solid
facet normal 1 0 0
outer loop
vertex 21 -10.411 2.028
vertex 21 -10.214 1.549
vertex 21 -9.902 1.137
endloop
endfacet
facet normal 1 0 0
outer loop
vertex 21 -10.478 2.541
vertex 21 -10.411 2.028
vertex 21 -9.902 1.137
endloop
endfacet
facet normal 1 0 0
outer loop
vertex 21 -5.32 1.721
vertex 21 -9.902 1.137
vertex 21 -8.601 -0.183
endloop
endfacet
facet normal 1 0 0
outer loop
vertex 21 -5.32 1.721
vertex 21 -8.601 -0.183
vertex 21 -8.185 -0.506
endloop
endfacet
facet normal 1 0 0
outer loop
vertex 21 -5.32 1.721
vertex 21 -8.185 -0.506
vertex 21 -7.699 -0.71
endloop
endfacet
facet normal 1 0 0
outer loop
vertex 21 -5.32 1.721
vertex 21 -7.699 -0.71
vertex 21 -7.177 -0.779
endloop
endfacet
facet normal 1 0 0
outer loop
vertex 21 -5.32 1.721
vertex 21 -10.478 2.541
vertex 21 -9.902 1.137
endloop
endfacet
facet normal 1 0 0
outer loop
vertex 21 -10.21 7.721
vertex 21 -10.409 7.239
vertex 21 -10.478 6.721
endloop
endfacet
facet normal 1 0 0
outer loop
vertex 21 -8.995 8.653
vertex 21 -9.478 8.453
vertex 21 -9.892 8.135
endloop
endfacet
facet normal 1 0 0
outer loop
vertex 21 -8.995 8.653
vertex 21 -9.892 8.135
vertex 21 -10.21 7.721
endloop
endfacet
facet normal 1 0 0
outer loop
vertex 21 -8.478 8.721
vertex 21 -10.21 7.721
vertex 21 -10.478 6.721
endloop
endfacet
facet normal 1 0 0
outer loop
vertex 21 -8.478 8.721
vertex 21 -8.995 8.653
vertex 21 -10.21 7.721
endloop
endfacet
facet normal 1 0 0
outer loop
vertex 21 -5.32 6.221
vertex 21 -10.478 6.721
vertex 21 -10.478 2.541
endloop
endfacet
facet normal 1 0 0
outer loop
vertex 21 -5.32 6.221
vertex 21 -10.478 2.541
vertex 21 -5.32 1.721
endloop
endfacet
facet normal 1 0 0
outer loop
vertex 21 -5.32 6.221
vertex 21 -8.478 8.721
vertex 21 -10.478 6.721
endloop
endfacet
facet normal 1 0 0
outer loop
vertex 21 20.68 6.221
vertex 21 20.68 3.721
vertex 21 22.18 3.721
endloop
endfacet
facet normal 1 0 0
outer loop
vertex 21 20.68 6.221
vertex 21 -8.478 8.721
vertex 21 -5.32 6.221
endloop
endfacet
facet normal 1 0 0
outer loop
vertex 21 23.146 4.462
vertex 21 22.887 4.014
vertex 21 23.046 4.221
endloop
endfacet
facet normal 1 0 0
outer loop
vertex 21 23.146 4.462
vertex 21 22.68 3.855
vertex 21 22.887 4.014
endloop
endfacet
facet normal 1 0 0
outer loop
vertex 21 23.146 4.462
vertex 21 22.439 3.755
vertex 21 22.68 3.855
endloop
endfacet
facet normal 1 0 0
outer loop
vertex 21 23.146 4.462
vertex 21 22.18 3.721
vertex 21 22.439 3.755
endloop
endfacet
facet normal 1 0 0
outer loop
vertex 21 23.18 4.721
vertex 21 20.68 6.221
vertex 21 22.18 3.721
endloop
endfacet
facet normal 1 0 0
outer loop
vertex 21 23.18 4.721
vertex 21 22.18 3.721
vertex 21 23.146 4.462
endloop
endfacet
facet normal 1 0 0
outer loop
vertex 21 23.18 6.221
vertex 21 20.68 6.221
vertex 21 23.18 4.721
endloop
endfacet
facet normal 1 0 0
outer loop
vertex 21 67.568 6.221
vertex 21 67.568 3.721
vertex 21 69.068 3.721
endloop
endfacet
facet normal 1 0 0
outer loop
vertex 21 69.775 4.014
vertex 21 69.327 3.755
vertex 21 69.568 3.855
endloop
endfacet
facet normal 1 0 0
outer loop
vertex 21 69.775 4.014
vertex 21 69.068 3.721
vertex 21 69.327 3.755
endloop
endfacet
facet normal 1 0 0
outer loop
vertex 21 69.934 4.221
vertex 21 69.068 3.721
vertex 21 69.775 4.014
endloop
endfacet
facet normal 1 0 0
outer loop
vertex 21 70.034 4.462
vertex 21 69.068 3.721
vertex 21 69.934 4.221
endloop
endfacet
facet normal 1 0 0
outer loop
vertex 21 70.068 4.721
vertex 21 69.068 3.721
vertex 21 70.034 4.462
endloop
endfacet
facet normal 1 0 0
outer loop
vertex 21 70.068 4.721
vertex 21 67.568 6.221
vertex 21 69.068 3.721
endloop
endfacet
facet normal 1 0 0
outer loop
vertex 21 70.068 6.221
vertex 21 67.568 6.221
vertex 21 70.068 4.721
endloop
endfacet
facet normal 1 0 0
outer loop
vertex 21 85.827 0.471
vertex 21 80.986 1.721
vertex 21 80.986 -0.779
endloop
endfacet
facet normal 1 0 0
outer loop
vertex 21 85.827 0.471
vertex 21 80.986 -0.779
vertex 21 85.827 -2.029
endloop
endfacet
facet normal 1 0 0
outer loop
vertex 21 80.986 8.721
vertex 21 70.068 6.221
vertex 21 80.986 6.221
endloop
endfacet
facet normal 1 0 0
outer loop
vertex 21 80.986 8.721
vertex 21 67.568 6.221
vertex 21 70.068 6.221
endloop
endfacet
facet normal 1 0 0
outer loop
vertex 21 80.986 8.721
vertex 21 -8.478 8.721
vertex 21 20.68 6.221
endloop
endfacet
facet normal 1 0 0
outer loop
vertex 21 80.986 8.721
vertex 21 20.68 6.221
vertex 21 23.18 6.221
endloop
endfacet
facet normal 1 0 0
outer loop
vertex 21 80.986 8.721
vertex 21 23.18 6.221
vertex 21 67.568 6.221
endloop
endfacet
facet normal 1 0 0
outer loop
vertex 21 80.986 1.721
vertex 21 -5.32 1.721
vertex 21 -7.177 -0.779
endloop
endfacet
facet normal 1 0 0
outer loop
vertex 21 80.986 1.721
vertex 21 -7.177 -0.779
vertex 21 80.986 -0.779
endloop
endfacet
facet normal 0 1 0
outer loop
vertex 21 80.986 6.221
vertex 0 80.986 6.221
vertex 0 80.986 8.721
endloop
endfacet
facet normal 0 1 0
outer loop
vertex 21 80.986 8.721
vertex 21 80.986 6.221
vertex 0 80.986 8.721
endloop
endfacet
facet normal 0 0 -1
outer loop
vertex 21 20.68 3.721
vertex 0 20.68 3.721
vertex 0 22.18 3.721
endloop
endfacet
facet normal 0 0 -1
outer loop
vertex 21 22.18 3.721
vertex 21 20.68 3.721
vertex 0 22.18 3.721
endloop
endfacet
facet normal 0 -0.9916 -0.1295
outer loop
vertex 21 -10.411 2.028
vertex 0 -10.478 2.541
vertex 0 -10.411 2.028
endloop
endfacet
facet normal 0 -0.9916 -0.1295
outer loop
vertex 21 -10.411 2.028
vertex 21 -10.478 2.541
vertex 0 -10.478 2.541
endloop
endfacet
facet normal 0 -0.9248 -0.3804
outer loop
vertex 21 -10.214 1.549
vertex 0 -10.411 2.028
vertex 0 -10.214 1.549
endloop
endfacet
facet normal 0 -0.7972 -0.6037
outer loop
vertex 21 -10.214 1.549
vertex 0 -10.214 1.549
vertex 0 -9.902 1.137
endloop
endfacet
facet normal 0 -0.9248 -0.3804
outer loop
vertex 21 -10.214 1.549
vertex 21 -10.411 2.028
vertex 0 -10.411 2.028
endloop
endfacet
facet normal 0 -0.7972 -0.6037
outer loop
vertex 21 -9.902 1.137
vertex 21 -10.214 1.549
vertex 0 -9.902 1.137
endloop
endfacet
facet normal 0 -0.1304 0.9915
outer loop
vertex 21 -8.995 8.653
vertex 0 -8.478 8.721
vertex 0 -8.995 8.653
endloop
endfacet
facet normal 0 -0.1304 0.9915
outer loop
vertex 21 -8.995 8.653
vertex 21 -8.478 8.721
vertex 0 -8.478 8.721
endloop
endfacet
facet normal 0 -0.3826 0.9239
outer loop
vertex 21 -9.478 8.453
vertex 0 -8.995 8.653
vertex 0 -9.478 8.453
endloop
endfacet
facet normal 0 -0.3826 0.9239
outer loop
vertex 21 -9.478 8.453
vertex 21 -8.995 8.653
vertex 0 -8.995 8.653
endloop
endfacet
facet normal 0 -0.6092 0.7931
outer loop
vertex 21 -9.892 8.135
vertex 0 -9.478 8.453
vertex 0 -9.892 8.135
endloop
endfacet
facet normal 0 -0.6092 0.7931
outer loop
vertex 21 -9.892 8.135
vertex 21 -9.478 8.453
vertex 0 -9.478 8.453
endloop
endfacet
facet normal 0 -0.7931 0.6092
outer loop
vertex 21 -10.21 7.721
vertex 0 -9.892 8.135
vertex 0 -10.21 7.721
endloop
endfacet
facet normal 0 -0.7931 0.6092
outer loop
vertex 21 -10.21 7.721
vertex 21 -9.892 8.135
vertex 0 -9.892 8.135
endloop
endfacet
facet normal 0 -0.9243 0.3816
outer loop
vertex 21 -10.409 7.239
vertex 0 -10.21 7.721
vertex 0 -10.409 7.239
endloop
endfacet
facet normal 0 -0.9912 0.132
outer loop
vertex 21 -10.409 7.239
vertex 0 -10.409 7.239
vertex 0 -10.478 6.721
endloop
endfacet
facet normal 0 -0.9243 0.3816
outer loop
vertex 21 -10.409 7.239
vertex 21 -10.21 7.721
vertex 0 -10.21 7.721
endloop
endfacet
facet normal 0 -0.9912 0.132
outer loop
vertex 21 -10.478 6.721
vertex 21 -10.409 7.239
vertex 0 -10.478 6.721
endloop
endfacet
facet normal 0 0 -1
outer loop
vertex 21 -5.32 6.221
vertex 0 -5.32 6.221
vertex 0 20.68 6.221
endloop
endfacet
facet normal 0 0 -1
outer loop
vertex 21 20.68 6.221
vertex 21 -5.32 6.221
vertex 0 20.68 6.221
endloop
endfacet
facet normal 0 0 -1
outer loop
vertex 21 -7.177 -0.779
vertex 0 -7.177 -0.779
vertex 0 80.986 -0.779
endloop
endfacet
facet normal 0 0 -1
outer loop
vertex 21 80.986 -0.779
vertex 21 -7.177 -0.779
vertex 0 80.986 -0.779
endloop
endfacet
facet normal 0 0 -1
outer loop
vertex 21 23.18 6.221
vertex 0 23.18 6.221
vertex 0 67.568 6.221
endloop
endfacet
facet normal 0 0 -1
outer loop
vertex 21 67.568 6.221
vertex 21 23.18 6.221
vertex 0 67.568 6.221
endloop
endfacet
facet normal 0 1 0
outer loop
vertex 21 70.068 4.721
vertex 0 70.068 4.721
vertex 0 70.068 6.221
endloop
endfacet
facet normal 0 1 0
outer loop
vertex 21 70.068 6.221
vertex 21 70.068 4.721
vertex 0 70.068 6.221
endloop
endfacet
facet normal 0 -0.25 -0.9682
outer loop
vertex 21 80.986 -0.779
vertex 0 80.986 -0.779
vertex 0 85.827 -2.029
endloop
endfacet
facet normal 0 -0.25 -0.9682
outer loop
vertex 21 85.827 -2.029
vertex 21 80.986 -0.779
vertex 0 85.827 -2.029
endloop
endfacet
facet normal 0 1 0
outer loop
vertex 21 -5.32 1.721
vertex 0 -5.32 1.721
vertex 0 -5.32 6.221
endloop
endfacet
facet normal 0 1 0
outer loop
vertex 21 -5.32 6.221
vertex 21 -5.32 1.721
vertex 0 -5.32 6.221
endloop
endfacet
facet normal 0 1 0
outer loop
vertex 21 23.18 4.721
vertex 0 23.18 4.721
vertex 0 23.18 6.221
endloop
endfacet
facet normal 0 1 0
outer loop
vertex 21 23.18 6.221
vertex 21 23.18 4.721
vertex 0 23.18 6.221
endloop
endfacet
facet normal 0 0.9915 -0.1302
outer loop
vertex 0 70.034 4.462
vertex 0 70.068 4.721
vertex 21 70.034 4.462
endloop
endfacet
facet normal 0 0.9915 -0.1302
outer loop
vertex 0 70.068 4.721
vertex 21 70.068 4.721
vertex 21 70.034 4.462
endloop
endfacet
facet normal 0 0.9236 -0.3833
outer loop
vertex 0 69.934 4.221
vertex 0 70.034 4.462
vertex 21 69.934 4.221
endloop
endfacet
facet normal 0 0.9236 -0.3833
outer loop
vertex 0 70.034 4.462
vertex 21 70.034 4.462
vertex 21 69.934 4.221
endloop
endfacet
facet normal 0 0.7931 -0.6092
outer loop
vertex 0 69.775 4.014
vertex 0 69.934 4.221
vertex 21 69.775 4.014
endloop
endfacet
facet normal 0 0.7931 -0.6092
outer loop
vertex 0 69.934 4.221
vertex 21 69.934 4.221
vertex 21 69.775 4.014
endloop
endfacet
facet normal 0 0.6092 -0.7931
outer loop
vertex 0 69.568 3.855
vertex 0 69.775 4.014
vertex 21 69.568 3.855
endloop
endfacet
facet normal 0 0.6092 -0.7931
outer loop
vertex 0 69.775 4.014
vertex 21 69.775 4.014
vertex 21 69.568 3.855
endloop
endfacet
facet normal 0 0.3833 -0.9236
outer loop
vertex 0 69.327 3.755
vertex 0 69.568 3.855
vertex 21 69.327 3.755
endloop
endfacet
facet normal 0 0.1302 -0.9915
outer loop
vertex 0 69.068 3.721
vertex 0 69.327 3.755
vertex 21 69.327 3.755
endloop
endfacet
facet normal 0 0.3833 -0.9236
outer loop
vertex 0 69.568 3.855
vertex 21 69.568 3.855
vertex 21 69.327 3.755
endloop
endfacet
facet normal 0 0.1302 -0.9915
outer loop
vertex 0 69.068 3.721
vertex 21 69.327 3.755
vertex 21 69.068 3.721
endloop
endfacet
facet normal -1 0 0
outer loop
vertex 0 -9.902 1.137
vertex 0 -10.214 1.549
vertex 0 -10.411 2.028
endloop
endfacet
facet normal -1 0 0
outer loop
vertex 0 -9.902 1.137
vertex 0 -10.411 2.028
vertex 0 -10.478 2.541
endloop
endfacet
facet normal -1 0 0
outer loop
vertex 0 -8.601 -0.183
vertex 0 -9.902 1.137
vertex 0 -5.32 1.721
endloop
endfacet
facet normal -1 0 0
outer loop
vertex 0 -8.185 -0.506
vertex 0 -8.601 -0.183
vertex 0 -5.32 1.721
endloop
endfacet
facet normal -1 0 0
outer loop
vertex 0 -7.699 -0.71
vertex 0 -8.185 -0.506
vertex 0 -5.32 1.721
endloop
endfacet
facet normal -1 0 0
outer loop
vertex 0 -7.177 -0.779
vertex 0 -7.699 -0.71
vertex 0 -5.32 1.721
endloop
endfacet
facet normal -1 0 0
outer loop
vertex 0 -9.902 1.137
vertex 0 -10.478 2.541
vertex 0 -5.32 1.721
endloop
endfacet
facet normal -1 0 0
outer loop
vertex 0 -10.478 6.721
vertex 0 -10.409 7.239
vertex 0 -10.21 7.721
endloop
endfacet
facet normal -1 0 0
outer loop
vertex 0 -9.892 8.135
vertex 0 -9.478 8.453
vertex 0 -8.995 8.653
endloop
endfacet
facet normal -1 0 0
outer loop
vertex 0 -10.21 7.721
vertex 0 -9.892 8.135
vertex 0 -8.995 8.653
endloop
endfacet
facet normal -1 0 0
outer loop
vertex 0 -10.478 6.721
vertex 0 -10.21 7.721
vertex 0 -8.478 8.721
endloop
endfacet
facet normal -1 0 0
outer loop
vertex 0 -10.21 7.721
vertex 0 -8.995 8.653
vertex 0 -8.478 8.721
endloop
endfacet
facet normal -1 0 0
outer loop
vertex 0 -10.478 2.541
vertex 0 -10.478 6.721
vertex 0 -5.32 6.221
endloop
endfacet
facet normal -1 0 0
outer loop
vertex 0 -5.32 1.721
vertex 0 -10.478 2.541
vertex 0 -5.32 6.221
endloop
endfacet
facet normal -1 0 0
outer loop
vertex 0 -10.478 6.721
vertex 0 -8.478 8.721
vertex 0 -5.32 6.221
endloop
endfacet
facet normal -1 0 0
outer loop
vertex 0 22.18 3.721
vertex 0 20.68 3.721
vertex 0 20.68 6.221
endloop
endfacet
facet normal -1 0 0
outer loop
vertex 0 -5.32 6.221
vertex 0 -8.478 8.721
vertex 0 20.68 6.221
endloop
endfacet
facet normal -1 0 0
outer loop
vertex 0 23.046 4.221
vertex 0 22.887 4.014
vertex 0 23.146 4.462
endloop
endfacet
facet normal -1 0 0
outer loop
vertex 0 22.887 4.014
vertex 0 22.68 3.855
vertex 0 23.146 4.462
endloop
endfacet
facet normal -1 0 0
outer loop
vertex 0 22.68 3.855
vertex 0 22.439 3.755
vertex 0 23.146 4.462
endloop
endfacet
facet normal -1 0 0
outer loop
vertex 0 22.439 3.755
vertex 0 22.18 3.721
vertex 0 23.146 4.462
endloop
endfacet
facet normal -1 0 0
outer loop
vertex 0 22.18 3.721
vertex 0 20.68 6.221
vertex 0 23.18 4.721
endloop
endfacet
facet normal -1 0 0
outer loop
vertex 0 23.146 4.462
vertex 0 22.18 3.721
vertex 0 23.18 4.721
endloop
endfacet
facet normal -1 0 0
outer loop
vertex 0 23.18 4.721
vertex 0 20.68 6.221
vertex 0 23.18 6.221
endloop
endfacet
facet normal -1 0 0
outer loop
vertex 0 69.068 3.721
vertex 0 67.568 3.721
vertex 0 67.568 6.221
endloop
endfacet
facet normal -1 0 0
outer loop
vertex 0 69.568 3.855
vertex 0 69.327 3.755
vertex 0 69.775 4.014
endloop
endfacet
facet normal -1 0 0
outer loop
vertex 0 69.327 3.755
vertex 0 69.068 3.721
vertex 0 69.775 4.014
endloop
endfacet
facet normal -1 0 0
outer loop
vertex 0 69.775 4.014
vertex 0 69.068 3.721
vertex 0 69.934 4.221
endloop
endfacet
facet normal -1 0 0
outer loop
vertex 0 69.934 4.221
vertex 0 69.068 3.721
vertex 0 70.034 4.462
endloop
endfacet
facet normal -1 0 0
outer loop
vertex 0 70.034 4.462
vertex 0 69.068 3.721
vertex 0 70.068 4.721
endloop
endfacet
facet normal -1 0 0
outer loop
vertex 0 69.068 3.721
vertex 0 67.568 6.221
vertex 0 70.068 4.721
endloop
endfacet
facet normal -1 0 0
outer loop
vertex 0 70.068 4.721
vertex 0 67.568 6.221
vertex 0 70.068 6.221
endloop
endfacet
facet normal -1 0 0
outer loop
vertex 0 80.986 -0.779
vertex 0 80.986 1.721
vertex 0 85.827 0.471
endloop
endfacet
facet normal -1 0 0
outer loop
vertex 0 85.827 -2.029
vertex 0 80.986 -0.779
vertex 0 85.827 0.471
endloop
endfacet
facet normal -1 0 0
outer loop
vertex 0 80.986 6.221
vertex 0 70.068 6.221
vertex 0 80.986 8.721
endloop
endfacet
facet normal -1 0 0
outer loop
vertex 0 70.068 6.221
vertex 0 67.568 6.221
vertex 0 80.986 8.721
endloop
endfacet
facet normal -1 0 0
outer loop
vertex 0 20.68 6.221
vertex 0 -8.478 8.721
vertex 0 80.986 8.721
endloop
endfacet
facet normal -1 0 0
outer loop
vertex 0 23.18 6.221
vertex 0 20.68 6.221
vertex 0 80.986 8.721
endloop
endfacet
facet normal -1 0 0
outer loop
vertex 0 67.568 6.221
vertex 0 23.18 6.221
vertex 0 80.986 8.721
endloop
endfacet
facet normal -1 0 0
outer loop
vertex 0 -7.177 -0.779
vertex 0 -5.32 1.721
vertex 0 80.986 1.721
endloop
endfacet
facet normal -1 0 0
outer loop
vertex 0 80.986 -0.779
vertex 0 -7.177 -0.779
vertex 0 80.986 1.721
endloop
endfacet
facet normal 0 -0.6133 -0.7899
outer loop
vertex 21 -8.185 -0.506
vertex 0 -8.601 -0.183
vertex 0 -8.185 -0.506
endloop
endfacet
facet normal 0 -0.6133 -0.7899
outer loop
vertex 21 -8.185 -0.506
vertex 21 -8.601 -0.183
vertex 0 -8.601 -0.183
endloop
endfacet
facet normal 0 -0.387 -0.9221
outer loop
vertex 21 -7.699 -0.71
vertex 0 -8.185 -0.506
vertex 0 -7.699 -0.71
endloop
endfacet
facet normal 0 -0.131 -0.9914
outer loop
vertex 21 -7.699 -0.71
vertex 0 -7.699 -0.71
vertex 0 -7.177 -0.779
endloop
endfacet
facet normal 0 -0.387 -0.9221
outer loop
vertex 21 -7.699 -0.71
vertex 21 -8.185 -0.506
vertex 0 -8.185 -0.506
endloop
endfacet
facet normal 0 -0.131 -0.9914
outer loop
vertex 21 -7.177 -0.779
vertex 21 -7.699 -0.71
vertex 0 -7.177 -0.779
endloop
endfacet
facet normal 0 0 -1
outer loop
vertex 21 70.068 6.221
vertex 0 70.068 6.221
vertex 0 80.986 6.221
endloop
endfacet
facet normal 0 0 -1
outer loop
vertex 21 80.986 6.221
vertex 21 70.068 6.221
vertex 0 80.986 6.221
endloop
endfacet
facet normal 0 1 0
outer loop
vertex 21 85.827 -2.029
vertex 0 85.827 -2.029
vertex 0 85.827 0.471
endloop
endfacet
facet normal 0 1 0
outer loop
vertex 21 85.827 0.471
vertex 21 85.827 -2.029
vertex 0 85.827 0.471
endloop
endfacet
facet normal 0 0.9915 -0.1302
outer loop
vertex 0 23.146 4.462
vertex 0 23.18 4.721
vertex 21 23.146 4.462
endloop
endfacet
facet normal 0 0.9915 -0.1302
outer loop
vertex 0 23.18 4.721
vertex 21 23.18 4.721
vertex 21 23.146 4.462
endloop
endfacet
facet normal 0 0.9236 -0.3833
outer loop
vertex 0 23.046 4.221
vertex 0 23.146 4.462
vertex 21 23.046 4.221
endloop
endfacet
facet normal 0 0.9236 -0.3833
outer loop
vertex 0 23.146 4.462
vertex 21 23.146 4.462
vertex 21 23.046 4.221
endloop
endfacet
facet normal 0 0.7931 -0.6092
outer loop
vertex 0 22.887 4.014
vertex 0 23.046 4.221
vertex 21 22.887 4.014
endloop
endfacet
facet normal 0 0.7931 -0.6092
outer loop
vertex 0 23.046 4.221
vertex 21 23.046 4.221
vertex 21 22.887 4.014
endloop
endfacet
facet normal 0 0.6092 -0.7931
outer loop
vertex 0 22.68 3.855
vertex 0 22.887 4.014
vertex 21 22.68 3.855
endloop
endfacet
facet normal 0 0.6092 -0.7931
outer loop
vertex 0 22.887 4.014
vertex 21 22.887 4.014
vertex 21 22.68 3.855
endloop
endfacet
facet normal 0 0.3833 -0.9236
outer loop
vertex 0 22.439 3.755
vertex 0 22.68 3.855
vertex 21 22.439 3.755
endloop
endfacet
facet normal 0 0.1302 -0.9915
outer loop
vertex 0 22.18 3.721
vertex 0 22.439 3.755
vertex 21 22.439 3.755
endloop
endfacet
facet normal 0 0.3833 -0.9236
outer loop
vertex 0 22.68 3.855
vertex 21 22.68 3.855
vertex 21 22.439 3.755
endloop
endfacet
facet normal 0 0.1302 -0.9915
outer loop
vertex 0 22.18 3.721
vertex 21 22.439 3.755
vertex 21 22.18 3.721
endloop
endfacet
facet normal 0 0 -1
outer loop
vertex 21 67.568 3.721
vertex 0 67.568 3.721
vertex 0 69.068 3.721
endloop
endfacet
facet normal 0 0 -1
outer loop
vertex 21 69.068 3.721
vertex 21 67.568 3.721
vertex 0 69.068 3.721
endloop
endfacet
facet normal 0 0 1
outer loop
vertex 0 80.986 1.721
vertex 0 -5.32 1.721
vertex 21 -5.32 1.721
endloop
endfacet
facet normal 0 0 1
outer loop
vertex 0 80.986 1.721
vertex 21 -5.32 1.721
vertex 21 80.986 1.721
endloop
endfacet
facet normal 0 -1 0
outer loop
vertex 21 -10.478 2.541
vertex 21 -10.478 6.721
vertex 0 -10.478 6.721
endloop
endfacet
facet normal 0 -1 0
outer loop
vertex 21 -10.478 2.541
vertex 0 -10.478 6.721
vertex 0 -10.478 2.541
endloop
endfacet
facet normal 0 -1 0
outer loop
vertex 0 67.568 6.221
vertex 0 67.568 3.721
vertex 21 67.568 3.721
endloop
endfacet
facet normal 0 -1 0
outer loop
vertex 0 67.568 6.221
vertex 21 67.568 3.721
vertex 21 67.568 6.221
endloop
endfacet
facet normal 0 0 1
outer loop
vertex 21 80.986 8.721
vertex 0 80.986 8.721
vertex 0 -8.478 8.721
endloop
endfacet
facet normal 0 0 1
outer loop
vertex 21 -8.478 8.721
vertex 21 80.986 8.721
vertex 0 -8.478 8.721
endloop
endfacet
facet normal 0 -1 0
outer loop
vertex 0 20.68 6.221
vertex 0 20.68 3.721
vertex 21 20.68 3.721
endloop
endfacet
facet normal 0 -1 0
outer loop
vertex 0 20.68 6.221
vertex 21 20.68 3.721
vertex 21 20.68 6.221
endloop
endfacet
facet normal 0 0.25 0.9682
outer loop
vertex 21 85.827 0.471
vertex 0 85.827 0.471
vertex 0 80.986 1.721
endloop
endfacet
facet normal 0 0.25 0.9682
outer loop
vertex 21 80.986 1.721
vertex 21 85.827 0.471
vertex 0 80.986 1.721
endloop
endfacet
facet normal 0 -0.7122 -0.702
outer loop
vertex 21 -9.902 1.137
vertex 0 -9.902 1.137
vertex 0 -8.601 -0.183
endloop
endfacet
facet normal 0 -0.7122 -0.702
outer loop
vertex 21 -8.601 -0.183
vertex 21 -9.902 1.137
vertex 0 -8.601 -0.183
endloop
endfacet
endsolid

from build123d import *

# Parameters (mm, degrees)
F0_W     = 2.694248
F0_H     = 4.5
F0_H_2   = 2.5
F0_W_2   = 86.305752
F0_W_3   = 26
F0_W_4   = 2.5
F1_DEPTH = 21
F2_R     = 2
F3_R     = 1


with BuildPart() as f1:
    # F0 (on Right) → F1 (new body)
    with BuildSketch(Plane.YZ):
        Polygon((23.180372, 8.721056), (23.180372, 6.221056), (67.568183, 6.221056), (70.068183, 6.221056), (80.986124, 6.221056), (80.986124, 8.721056), align=None)
        with Locations((-6.666752, 3.971056)):
            Rectangle(F0_W, F0_H)
        with Locations((-6.666752, 0.471056)):
            Rectangle(F0_W, F0_H_2)
        with Locations((37.833248, 0.471056)):
            Rectangle(F0_W_2, F0_H_2)
        with Locations((7.680372, 7.471056)):
            Rectangle(F0_W_3, F0_H_2)
        Polygon((-8.013876, -0.778944), (-8.013876, 1.721056), (-8.013876, 6.221056), (-8.013876, 8.721056), (-10.4775, 8.721056), (-10.4775, 7.235875), (-10.4775, 1.721056), align=None)
        with Locations((-6.666752, 7.471056)):
            Rectangle(F0_W, F0_H_2)
        with Locations((21.930372, 7.471056)):
            Rectangle(F0_W_4, F0_H_2)
        with Locations((68.818183, 4.971056)):
            Rectangle(F0_W_4, F0_H_2)
        with Locations((21.930372, 4.971056)):
            Rectangle(F0_W_4, F0_H_2)
        Polygon((85.827354, 0.471056), (80.986124, 1.721056), (80.986124, -0.778944), (85.827354, -2.028944), align=None)
    extrude(amount=F1_DEPTH)

    # F2
    f2_edges = [f1.edges().sort_by_distance(p)[0] for p in [
        (10.5, -10.4775, 8.721056),
        (10.5, -8.013876, -0.778944),
        (10.5, -10.4775, 1.721056),
    ]]
    fillet(f2_edges, radius=F2_R)

    # F3
    f3_edges = [f1.edges().sort_by_distance(p)[0] for p in [
        (10.5, 23.180372, 3.721056),
        (10.5, 70.068183, 3.721056),
    ]]
    fillet(f3_edges, radius=F3_R)


solid = f1.part
